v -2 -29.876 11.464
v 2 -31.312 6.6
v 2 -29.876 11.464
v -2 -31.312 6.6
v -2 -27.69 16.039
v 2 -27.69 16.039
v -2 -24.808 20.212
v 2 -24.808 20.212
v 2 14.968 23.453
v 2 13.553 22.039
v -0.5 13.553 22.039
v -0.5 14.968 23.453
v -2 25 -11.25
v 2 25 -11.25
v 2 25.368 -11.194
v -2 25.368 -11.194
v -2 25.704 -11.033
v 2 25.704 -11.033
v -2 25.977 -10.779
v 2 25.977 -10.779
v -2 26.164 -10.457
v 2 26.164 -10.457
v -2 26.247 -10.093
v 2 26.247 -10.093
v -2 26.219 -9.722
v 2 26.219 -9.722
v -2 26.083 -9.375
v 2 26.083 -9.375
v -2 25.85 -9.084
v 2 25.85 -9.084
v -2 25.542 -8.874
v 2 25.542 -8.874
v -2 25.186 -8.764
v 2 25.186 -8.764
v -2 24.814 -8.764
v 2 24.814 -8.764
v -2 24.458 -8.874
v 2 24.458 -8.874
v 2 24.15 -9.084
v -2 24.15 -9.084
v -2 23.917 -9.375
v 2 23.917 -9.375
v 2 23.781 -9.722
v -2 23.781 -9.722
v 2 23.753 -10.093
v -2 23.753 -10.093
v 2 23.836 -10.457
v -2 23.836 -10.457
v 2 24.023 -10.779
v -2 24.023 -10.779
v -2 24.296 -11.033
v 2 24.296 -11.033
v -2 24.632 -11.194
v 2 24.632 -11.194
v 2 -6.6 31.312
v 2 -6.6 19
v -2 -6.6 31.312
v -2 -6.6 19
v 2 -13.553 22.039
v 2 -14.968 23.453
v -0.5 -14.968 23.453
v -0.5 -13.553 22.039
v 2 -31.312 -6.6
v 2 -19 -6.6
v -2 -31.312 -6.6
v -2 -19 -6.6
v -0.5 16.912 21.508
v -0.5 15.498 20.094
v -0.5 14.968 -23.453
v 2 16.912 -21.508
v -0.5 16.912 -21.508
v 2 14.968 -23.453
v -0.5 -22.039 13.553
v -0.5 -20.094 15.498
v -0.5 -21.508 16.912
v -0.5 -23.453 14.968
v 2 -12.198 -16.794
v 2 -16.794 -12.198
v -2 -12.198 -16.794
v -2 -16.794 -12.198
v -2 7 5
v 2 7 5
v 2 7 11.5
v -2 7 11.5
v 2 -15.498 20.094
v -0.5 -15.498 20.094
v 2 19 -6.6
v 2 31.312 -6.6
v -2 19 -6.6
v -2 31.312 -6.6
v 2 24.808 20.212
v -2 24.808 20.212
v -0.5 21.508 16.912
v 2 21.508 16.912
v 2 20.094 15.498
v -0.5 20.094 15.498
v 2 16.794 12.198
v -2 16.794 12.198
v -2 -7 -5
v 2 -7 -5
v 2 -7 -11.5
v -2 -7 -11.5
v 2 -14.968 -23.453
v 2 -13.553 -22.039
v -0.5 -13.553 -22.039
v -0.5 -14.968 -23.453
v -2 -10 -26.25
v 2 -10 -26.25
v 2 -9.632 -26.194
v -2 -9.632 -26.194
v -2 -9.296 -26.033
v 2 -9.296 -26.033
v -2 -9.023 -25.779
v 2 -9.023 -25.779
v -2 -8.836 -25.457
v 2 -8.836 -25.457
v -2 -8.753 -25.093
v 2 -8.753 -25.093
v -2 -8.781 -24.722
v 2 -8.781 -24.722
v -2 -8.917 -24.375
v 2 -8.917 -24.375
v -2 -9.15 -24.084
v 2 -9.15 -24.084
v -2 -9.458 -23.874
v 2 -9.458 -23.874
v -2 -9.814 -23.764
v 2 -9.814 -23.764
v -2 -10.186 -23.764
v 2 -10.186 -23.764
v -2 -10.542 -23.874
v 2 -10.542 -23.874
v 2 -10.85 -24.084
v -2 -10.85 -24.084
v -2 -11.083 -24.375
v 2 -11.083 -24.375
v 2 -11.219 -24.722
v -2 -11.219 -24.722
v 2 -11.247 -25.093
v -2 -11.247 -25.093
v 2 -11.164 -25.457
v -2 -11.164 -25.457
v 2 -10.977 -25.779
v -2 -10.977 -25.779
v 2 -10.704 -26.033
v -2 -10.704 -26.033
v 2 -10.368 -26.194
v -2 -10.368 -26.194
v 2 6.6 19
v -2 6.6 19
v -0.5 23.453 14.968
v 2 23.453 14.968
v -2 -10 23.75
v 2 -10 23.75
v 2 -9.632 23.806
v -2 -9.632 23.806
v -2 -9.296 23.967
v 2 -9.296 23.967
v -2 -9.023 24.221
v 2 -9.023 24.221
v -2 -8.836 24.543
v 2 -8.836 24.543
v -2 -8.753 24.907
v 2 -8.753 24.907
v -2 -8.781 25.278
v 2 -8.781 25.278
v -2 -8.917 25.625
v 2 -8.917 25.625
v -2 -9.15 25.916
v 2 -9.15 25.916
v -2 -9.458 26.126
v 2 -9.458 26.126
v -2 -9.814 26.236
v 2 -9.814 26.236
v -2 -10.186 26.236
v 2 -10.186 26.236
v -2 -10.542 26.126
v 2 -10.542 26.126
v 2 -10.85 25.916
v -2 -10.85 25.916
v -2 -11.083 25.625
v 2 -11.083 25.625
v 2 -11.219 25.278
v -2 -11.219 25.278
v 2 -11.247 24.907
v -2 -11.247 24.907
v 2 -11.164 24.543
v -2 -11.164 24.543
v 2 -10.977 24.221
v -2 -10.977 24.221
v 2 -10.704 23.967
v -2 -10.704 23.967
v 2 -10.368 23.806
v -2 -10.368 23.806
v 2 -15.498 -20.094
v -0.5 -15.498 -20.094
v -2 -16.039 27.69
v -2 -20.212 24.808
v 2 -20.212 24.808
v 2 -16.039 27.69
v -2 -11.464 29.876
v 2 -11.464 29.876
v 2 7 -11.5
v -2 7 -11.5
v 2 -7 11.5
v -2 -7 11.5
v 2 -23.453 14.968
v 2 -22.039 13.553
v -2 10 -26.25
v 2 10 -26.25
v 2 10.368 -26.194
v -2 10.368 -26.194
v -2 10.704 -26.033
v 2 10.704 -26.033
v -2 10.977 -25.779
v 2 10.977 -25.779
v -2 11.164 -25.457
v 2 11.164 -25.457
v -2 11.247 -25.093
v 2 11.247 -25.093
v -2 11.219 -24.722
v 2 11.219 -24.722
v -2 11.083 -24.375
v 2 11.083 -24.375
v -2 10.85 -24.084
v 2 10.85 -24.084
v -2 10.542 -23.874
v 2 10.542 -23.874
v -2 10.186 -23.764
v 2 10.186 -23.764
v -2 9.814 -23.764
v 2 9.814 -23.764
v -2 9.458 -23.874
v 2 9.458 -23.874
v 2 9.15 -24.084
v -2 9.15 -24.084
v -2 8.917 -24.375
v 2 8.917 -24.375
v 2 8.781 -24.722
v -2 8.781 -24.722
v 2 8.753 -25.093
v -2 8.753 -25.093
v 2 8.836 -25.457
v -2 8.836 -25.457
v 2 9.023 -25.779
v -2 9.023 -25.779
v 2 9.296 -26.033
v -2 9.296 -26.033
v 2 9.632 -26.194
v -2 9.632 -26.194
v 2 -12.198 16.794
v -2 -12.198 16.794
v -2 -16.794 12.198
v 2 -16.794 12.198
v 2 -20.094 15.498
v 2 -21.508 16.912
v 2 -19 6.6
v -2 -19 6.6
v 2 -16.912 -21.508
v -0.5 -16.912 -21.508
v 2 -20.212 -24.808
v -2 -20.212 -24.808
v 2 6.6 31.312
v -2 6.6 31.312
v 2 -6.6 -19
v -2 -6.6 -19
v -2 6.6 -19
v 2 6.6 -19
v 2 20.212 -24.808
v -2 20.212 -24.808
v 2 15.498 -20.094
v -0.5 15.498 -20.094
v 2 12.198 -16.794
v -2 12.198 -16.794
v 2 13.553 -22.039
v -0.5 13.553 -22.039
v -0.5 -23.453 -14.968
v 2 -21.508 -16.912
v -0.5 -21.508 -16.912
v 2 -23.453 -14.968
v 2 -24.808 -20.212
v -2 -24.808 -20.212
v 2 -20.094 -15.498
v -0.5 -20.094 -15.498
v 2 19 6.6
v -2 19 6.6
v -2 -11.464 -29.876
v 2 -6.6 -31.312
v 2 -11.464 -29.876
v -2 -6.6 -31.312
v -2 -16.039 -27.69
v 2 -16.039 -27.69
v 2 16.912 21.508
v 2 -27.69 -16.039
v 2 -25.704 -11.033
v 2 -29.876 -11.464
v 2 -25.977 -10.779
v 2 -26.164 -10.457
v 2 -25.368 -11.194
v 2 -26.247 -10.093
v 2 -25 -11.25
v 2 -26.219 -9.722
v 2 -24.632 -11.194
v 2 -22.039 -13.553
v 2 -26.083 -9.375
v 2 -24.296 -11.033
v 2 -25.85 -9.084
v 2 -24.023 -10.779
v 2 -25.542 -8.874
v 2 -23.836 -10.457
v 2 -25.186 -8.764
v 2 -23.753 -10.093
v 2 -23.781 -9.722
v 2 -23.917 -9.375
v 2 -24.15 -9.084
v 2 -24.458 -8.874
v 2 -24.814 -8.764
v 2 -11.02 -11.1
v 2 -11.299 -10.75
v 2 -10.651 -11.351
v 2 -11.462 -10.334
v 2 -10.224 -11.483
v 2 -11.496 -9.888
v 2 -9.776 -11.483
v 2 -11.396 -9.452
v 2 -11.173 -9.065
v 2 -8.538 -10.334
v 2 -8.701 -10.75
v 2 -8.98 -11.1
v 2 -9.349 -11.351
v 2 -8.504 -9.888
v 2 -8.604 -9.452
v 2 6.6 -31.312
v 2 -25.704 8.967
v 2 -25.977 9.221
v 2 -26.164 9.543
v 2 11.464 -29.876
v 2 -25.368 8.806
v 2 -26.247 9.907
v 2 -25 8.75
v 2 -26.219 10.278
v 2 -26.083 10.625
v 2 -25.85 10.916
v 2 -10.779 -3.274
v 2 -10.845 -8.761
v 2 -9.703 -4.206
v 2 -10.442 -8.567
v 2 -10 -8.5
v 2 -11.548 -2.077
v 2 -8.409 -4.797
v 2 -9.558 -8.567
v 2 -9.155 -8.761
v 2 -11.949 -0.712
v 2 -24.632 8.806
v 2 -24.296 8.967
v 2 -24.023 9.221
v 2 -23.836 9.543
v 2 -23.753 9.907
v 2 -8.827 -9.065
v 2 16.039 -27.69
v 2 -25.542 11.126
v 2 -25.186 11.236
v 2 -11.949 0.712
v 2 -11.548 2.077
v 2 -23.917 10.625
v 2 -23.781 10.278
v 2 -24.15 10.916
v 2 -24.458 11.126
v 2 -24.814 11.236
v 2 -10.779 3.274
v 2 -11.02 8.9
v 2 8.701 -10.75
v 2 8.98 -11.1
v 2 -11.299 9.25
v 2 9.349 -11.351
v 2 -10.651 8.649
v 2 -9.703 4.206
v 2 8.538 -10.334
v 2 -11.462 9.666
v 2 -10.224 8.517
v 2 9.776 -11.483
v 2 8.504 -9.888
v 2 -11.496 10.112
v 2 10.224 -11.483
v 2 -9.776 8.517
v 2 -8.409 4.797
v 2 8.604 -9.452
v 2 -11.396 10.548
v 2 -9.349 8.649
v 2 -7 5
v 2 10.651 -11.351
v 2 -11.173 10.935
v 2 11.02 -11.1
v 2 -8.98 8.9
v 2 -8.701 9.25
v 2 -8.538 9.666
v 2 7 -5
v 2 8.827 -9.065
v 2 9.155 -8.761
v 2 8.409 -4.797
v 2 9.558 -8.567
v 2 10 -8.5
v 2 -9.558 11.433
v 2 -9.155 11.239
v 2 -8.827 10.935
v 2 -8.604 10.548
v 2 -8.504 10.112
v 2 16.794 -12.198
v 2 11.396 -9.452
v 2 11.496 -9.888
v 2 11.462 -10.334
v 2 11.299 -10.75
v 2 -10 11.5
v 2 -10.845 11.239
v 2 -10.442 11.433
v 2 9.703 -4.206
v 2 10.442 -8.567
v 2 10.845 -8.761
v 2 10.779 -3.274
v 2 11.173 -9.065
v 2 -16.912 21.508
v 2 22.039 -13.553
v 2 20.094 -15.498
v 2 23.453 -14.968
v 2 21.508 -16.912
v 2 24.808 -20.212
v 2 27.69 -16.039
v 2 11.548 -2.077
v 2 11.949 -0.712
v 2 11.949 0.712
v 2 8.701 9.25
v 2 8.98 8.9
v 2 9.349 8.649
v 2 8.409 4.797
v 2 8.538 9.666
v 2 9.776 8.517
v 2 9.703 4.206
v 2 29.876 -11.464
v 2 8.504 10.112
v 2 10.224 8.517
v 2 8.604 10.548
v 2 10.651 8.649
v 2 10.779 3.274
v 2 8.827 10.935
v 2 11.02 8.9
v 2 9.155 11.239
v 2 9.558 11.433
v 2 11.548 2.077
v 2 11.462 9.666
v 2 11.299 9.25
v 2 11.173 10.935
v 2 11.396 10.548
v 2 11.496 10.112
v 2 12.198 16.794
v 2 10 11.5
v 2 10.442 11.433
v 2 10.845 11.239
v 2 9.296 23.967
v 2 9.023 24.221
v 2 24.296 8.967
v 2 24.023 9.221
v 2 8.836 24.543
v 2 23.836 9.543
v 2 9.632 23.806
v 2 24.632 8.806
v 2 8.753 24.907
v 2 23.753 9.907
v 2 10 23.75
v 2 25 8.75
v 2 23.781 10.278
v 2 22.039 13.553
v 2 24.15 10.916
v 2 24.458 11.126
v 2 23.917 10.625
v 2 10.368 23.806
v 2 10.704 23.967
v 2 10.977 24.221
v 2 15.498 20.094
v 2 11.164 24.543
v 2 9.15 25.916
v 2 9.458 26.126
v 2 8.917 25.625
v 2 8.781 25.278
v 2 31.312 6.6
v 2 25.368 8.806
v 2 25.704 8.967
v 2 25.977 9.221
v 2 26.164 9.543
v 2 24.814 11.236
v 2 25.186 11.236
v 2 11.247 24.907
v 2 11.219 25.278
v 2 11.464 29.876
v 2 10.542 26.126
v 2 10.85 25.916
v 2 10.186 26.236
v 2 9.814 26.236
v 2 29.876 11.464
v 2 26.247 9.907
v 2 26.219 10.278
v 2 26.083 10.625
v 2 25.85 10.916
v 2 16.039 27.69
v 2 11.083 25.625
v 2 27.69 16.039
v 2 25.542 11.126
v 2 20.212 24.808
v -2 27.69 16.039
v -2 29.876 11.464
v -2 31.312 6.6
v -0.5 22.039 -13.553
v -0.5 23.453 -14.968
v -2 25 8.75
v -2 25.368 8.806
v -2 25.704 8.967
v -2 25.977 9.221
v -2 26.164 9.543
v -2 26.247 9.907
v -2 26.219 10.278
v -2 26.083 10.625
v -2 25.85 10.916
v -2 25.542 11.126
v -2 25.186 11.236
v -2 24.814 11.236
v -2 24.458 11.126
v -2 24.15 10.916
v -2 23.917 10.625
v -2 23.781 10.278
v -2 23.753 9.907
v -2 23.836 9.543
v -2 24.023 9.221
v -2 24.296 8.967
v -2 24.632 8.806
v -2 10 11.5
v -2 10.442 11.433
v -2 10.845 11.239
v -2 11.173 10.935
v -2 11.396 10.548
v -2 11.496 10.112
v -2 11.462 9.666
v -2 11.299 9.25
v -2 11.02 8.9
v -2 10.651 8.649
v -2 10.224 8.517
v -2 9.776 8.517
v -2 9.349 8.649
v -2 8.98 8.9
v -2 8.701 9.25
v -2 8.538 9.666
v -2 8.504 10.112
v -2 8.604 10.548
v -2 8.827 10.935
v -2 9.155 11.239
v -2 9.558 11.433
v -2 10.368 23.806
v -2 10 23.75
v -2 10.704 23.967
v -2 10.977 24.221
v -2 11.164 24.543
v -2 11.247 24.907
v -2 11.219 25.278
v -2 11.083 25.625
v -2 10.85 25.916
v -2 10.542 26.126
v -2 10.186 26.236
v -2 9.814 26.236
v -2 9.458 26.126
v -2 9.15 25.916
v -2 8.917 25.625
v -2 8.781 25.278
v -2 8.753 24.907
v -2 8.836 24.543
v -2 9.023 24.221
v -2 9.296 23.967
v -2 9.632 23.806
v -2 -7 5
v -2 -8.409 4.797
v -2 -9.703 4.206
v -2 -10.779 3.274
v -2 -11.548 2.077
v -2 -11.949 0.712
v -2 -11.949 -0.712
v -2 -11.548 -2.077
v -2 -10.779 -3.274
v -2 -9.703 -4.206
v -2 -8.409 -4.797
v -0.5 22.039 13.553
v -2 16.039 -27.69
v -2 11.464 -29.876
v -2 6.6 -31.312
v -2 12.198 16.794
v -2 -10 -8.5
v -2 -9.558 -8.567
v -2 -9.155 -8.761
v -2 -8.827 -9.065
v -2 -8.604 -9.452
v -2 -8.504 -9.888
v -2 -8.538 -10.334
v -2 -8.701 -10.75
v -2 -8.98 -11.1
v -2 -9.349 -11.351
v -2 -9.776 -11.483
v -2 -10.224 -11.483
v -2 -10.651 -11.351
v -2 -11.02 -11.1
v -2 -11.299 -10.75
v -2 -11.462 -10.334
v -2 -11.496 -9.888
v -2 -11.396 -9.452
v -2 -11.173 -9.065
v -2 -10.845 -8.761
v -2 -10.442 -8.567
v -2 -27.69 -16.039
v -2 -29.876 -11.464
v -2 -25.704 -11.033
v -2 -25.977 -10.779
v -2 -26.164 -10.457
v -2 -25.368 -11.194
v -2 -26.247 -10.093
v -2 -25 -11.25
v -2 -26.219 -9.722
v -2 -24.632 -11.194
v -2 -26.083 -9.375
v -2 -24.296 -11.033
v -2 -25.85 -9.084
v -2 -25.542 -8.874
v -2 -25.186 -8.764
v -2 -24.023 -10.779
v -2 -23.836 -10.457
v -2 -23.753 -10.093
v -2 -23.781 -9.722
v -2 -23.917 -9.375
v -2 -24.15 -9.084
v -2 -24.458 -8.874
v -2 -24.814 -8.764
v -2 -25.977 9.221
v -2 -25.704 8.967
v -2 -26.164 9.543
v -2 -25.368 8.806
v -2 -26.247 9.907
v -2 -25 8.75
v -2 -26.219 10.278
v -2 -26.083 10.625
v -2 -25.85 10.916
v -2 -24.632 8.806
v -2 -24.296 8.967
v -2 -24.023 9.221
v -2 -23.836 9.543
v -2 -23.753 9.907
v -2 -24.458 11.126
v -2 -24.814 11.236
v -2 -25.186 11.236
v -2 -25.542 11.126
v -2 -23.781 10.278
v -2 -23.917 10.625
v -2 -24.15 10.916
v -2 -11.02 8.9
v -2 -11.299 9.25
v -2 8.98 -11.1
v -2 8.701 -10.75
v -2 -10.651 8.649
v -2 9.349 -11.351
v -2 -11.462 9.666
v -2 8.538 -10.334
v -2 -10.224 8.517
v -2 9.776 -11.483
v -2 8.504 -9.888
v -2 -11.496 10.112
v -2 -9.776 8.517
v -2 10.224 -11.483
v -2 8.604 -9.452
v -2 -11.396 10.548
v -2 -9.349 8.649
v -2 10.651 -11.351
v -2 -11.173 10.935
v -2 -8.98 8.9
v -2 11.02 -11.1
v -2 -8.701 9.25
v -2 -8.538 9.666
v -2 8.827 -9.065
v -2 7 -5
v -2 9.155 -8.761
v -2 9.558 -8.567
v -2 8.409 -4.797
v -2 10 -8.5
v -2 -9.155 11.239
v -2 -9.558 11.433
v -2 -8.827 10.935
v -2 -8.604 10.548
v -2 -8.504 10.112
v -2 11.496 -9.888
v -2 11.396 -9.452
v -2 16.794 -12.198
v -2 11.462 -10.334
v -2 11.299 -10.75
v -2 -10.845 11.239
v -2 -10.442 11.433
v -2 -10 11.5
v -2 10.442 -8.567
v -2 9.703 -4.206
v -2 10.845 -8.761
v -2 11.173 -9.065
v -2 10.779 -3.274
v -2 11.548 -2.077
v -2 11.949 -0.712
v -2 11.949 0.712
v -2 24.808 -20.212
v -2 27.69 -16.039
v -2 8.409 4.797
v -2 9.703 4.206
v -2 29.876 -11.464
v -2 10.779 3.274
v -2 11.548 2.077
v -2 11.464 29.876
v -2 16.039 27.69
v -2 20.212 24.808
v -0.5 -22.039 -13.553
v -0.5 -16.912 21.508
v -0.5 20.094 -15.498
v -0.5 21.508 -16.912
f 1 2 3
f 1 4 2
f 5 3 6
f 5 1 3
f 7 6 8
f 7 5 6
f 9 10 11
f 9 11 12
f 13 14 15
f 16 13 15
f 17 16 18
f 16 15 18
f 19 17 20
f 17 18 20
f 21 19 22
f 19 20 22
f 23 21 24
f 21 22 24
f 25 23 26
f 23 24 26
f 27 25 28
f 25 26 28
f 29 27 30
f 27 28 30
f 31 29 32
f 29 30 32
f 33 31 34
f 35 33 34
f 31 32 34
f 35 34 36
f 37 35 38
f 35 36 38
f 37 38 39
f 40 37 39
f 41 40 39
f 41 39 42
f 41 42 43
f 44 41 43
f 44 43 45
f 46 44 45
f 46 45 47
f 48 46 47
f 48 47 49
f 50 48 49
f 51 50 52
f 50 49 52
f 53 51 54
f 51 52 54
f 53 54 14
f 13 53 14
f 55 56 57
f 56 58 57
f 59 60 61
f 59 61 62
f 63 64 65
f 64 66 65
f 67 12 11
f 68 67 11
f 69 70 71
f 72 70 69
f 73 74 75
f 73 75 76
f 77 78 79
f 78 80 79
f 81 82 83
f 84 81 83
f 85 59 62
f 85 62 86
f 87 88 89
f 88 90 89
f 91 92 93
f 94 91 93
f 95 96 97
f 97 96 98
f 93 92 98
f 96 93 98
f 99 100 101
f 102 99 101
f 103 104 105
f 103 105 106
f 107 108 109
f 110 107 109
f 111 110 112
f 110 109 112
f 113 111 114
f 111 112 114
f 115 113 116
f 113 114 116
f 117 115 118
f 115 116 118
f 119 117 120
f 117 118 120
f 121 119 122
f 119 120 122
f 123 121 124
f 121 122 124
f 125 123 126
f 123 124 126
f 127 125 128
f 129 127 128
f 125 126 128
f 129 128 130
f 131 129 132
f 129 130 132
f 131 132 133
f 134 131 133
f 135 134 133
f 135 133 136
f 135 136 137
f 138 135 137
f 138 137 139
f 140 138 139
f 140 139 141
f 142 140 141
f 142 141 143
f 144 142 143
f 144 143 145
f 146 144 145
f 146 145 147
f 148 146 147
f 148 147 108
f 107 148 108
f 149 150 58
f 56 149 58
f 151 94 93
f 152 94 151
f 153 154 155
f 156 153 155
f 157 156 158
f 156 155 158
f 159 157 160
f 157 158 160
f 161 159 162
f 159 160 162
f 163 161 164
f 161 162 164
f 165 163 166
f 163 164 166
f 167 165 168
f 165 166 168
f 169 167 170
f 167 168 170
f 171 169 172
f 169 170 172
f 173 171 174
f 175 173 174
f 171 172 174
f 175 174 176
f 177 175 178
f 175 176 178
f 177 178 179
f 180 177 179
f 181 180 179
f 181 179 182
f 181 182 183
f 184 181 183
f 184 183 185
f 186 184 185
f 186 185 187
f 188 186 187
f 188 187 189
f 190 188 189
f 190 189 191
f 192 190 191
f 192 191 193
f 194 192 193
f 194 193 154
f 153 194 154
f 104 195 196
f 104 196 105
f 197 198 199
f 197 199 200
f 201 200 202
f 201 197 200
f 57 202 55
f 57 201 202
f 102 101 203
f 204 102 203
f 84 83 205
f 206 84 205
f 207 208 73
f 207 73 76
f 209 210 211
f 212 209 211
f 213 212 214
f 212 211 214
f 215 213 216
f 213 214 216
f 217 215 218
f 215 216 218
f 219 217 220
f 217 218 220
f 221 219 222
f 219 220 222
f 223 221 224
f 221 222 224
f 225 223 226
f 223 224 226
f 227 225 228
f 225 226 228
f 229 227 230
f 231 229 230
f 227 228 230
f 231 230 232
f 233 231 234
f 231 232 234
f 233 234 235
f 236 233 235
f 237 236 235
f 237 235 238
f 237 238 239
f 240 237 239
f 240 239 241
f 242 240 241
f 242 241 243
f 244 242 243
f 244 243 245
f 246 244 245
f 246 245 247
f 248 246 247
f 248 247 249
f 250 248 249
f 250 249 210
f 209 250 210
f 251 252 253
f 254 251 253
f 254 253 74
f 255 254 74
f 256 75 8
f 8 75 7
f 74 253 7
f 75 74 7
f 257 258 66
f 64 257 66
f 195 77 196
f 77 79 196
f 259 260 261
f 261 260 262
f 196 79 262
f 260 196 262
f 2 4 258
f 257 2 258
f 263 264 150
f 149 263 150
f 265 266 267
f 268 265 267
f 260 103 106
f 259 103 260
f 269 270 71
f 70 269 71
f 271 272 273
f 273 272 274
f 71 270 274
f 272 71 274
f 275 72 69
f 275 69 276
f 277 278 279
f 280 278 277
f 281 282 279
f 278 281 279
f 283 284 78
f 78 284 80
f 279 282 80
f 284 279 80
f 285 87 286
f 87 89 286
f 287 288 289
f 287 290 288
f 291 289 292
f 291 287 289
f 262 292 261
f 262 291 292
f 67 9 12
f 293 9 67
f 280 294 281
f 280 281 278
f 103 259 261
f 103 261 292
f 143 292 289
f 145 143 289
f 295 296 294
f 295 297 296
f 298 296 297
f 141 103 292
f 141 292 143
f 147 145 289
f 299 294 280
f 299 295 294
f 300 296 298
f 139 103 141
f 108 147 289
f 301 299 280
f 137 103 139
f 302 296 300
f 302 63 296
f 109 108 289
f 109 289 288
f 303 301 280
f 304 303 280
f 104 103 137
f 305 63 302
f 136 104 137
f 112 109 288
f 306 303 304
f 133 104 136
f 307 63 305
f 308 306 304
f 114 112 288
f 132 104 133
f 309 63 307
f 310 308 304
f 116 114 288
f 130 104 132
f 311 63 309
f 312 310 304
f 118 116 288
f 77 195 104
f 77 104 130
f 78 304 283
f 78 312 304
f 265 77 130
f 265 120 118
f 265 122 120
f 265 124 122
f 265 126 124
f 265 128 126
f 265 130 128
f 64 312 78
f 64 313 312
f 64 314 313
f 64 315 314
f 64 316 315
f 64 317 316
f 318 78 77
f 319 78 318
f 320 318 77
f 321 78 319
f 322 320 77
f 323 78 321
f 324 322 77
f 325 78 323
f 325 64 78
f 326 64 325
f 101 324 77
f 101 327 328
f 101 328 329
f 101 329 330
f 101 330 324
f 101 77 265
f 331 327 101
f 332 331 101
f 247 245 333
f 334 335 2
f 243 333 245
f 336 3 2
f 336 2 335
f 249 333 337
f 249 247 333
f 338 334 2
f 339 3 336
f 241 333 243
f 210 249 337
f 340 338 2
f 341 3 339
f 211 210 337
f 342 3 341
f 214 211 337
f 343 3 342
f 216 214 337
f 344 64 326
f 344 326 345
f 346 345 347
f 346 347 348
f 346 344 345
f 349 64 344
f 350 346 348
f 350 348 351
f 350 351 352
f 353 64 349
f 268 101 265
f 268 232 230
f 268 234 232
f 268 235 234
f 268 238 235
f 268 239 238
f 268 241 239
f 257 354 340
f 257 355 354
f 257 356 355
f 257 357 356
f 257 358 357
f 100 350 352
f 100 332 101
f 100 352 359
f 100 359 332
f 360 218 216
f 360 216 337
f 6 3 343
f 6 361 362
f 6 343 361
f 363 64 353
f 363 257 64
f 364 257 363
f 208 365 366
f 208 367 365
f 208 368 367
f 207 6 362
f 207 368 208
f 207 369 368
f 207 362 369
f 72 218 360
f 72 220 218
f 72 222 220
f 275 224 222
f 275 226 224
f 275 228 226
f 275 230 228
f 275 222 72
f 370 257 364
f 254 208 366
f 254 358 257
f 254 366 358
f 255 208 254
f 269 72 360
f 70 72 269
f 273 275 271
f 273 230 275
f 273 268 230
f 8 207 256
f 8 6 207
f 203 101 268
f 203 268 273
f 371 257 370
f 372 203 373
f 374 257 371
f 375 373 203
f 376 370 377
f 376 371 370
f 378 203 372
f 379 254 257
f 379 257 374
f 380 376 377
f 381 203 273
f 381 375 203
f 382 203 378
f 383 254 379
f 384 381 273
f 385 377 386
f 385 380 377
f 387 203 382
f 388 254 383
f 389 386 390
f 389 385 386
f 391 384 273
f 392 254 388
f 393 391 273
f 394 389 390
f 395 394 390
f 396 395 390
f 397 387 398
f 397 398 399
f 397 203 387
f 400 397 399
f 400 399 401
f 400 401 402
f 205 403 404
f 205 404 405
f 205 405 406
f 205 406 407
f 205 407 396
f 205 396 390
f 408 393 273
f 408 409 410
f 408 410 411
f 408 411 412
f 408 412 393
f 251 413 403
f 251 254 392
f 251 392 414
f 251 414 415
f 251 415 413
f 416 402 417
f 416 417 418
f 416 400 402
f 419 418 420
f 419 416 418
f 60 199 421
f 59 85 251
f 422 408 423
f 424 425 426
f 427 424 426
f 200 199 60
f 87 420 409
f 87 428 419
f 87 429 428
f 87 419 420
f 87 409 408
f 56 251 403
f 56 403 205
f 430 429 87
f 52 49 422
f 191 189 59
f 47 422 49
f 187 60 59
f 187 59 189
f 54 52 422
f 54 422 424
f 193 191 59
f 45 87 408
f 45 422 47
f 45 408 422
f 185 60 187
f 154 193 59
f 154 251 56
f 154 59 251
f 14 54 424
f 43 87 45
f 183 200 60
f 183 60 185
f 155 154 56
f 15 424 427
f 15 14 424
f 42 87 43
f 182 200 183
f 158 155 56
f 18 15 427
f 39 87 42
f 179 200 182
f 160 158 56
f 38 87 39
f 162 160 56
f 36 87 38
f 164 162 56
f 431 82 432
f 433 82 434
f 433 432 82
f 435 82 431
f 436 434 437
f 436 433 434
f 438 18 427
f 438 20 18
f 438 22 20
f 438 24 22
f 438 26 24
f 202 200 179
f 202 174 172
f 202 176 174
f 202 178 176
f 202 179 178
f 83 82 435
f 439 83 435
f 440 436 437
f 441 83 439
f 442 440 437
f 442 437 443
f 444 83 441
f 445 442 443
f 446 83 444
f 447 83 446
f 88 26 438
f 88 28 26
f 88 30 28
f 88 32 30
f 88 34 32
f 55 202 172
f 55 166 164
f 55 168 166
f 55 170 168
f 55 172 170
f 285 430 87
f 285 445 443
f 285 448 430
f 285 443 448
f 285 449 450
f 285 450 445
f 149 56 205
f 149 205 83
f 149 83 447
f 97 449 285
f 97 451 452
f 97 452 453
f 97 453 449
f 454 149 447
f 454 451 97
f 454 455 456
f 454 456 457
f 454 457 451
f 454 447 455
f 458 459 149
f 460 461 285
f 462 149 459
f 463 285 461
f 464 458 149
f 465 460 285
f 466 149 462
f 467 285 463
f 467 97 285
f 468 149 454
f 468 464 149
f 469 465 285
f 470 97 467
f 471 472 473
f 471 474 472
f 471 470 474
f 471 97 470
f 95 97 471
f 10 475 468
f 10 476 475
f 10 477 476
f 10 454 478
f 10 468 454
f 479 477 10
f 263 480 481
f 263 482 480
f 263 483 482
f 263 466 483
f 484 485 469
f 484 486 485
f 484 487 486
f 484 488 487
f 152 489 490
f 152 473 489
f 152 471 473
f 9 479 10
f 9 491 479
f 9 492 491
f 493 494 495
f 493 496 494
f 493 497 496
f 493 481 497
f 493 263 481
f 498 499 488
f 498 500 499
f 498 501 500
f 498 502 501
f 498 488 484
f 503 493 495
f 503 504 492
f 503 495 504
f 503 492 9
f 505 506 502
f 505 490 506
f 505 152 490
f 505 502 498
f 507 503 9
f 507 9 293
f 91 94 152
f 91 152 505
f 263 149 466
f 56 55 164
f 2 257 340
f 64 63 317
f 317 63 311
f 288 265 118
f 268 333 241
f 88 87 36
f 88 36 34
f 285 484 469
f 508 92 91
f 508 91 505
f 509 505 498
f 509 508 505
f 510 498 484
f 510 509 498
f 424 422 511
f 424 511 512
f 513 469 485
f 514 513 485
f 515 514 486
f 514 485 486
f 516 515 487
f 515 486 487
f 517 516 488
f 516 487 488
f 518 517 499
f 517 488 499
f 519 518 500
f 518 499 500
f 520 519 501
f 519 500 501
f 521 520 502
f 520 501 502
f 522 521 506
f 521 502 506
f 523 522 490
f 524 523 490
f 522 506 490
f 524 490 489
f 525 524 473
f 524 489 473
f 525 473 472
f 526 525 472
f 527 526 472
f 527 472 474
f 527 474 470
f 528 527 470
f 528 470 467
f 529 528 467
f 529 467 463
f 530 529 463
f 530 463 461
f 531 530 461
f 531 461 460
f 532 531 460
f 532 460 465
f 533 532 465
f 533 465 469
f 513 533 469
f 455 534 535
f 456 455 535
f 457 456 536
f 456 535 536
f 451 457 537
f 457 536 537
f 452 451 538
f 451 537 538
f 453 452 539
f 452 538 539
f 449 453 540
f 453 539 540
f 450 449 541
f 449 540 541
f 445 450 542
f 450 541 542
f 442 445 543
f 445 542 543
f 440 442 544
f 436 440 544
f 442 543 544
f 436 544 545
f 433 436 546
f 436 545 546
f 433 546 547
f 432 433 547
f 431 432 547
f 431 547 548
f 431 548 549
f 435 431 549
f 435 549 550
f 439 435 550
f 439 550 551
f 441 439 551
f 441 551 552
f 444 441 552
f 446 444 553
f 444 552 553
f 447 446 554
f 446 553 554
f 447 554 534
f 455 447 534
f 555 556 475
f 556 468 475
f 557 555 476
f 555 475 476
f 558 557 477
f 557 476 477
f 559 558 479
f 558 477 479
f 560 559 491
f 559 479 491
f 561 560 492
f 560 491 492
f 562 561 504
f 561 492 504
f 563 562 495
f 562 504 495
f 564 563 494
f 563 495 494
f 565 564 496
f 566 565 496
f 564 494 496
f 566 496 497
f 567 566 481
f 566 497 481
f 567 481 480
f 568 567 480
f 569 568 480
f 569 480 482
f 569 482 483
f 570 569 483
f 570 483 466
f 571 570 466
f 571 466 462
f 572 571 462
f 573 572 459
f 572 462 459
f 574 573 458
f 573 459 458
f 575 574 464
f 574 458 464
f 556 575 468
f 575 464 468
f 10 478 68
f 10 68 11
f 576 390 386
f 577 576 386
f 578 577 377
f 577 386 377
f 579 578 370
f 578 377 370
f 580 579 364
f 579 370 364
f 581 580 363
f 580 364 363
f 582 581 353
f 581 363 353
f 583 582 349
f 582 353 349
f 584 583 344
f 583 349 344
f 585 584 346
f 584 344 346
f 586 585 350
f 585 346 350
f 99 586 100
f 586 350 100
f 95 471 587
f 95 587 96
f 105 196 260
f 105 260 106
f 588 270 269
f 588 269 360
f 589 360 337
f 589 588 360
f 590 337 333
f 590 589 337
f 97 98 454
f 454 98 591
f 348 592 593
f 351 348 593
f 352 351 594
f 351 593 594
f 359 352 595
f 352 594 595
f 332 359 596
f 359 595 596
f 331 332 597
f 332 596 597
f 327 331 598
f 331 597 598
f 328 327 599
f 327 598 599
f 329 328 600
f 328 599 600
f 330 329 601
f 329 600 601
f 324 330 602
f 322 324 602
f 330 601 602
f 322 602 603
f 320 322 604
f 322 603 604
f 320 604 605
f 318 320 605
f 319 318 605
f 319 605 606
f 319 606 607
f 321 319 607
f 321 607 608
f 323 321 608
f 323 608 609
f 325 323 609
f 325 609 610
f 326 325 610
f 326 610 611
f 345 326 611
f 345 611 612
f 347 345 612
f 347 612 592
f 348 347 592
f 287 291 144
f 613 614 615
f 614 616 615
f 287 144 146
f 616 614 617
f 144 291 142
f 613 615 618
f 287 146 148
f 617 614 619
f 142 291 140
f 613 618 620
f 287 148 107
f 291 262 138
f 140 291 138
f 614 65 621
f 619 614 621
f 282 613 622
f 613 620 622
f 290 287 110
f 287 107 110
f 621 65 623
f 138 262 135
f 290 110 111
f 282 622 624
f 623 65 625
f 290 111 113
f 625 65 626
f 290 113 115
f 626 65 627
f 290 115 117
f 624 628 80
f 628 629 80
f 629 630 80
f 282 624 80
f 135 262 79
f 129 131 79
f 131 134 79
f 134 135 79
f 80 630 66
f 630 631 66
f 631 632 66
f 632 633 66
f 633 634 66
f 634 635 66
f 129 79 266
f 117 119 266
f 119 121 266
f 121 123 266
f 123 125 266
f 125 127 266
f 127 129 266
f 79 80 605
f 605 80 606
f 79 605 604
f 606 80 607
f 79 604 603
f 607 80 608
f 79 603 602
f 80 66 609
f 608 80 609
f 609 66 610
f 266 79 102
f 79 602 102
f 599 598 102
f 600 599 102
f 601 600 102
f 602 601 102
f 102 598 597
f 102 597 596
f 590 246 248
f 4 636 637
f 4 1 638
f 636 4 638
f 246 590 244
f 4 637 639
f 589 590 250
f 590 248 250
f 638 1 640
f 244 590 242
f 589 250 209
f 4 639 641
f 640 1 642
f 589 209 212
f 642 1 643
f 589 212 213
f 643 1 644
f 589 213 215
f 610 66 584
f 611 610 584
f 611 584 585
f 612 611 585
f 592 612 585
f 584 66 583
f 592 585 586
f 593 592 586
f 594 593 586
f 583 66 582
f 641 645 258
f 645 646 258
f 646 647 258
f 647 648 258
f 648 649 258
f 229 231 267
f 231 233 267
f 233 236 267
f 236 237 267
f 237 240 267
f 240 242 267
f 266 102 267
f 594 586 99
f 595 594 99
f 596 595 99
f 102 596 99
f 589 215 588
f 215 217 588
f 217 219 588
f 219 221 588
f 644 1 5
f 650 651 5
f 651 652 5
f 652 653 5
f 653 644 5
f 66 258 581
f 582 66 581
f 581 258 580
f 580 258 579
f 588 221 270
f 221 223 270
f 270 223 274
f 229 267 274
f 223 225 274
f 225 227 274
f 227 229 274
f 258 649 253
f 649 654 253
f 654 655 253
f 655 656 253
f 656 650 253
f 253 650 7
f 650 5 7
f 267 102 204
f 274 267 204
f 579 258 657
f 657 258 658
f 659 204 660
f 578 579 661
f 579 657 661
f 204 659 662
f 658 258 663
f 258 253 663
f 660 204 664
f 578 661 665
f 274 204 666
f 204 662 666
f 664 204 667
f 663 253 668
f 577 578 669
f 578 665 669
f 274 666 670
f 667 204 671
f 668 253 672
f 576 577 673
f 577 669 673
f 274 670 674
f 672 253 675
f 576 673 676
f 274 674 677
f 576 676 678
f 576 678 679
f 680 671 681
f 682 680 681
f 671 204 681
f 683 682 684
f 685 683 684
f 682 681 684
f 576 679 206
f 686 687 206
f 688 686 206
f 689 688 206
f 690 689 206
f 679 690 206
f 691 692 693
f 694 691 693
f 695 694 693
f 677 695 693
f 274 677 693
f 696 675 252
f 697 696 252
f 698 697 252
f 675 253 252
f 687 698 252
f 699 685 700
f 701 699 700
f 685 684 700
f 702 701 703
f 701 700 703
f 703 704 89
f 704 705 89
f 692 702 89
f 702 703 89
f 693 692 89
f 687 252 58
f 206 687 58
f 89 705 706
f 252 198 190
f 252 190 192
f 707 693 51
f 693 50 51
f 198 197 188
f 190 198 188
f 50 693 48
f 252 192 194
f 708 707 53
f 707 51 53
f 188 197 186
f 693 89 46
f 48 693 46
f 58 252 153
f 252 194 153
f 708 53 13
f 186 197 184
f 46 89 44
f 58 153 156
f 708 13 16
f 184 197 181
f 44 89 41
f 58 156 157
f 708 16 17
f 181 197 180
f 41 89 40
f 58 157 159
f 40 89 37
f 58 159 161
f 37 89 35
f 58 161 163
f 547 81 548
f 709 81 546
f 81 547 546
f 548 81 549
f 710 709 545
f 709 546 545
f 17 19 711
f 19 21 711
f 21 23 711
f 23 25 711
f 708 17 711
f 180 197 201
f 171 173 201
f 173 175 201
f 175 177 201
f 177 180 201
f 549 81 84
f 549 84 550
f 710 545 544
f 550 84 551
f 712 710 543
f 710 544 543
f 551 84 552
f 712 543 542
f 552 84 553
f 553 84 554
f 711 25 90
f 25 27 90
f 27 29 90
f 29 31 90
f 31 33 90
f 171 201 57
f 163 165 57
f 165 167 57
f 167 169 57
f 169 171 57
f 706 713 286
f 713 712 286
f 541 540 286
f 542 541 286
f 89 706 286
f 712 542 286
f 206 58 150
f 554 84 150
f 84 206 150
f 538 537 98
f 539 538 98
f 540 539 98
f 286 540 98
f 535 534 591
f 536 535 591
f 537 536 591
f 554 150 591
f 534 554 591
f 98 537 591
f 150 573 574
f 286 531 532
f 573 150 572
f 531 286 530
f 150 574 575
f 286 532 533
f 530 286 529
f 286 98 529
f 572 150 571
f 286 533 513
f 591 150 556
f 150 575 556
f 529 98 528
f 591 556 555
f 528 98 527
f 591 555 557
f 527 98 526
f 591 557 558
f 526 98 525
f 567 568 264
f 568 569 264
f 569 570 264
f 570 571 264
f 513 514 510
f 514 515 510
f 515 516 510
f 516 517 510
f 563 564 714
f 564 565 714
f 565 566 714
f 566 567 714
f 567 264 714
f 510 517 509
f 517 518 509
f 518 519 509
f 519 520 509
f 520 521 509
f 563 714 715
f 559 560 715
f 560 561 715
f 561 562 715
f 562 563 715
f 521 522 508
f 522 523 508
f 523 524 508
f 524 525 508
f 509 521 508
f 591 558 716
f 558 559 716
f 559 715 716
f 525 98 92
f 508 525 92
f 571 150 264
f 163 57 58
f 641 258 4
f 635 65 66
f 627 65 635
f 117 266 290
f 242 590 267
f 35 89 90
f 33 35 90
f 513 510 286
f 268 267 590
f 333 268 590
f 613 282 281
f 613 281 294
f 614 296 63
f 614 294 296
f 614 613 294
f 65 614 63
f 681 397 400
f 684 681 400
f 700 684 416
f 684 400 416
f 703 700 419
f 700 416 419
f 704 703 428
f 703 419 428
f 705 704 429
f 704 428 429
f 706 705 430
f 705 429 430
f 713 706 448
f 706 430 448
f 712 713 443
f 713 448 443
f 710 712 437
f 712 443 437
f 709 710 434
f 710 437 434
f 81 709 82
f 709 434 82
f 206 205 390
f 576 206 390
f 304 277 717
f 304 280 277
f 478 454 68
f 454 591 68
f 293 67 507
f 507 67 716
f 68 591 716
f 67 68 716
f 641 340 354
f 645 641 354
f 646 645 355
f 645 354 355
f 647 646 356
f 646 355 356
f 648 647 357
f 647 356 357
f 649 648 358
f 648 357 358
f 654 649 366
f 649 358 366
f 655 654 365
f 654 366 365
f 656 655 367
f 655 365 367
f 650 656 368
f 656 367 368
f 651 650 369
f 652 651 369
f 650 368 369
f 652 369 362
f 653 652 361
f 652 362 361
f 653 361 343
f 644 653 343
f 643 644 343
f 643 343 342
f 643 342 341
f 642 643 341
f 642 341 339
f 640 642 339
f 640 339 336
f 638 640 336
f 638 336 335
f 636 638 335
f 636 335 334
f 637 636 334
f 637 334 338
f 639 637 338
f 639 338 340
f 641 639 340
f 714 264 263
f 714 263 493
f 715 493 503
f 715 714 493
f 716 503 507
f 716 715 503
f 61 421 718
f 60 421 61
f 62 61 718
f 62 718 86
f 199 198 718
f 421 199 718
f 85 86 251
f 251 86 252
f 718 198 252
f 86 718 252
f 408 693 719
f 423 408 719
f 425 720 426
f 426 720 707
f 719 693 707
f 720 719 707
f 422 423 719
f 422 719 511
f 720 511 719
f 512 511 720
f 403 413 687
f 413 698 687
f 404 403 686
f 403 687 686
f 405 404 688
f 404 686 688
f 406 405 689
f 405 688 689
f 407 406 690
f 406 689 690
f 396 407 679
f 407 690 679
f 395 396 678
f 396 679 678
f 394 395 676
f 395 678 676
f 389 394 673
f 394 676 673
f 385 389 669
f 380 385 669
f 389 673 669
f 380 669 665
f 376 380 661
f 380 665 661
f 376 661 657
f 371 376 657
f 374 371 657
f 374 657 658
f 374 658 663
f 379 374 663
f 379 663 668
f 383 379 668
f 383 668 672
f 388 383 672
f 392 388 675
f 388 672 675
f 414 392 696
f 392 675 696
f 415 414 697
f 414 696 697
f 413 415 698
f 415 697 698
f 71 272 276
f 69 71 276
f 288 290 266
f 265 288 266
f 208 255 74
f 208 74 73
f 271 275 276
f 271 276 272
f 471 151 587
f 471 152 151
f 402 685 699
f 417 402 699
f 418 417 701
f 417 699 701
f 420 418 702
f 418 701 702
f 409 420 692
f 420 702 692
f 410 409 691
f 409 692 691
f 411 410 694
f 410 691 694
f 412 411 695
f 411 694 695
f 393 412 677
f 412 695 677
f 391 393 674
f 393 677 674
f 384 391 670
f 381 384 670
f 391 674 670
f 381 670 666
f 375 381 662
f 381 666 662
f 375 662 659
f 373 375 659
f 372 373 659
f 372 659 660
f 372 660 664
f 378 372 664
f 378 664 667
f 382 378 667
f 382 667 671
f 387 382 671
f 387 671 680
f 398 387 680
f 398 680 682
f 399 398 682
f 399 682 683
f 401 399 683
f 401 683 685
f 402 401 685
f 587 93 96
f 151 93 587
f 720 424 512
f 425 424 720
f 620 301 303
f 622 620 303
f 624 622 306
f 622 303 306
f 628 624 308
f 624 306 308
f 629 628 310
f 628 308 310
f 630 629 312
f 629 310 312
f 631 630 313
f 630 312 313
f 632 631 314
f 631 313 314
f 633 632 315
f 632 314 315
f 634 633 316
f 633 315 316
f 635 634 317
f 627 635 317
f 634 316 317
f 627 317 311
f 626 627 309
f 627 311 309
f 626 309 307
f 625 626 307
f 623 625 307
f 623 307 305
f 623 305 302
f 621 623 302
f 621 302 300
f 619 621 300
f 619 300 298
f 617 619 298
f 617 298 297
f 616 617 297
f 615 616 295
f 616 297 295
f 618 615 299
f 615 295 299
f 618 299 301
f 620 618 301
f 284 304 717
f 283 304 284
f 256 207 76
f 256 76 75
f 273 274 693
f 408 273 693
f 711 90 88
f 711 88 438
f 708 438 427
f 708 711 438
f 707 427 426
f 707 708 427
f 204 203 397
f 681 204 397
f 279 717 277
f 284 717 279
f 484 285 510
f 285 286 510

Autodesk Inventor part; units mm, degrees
ref_plane "YZ Plane" through (0, 0, 0) normal (1, 0, 0) x (0, 1, 0)
ref_plane "XZ Plane" through (0, 0, 0) normal (0, 1, 0) x (-1, 0, 0)
ref_plane "XY Plane" through (0, 0, 0) normal (0, 0, 1) x (1, 0, 0)
sketch "Náčrt1" plane through (0, 0, 0) normal (1, 0, 0) x (0, 1, 0)
  line L0 (19, 6.6) -> (31.312, 6.6)
  line L1 (31.312, -6.6) -> (19, -6.6)
  line L2 (19, -6.6) -> (19, 6.6)
  line L3 (24.8085, 20.2123) -> (16.7938, 12.1976)
  line L4 (16.7938, 12.1976) -> (12.1976, 16.7938)
  line L5 (12.1976, 16.7938) -> (20.2123, 24.8085)
  line L6 (0, 0) -> (14.4957, 14.4957)
  line L7 (6.6, 19) -> (-6.6, 19)
  line L8 (6.6, 31.312) -> (6.6, 19)
  line L9 (-6.6, 19) -> (-6.6, 31.312)
  line L10 (-20.2123, 24.8085) -> (-12.1976, 16.7938)
  line L11 (-12.1976, 16.7938) -> (-16.7938, 12.1976)
  line L12 (-16.7938, 12.1976) -> (-24.8085, 20.2123)
  line L13 (-19, 6.6) -> (-19, -6.6)
  line L14 (-31.312, 6.6) -> (-19, 6.6)
  line L15 (-19, -6.6) -> (-31.312, -6.6)
  line L16 (-24.8085, -20.2123) -> (-16.7938, -12.1976)
  line L17 (-16.7938, -12.1976) -> (-12.1976, -16.7938)
  line L18 (-12.1976, -16.7938) -> (-20.2123, -24.8085)
  line L19 (-6.6, -19) -> (6.6, -19)
  line L20 (-6.6, -31.312) -> (-6.6, -19)
  line L21 (6.6, -19) -> (6.6, -31.312)
  line L22 (20.2123, -24.8085) -> (12.1976, -16.7938)
  line L23 (12.1976, -16.7938) -> (16.7938, -12.1976)
  line L24 (16.7938, -12.1976) -> (24.8085, -20.2123)
  arc A0 (24.8085, -20.2123) -> (31.312, -6.6) centre (0, 0) ccw
  arc A1 (6.6, -31.312) -> (20.2123, -24.8085) centre (0, 0) ccw
  arc A2 (-20.2123, -24.8085) -> (-6.6, -31.312) centre (0, 0) ccw
  arc A3 (-31.312, -6.6) -> (-24.8085, -20.2123) centre (0, 0) ccw
  arc A4 (-24.8085, 20.2123) -> (-31.312, 6.6) centre (0, 0) ccw
  arc A5 (-6.6, 31.312) -> (-20.2123, 24.8085) centre (0, 0) ccw
  arc A6 (31.312, 6.6) -> (24.8085, 20.2123) centre (0, 0) ccw
  arc A7 (20.2123, 24.8085) -> (6.6, 31.312) centre (0, 0) ccw
  line L25 (16.205, 20.8011) -> (20.8011, 16.205)
  line L26 (14.9675, 23.4528) -> (13.5533, 22.0386)
  line L27 (13.5533, 22.0386) -> (22.0386, 13.5533)
  line L28 (22.0386, 13.5533) -> (23.4528, 14.9675)
  line L29 (23.4528, 14.9675) -> (14.9675, 23.4528)
  line L30 (-13.5533, 22.0386) -> (-14.9675, 23.4528)
  line L31 (-22.0386, 13.5533) -> (-13.5533, 22.0386)
  line L32 (-14.9675, 23.4528) -> (-23.4528, 14.9675)
  line L33 (-23.4528, 14.9675) -> (-22.0386, 13.5533)
  line L34 (-22.0386, -13.5533) -> (-23.4528, -14.9675)
  line L35 (-13.5533, -22.0386) -> (-22.0386, -13.5533)
  line L36 (-23.4528, -14.9675) -> (-14.9675, -23.4528)
  line L37 (-14.9675, -23.4528) -> (-13.5533, -22.0386)
  line L38 (13.5533, -22.0386) -> (14.9675, -23.4528)
  line L39 (22.0386, -13.5533) -> (13.5533, -22.0386)
  line L40 (14.9675, -23.4528) -> (23.4528, -14.9675)
  line L41 (23.4528, -14.9675) -> (22.0386, -13.5533)
  point P0 (-14.4957, 14.4957)
  point P1 (-14.4957, -14.4957)
  point P2 (14.4957, -14.4957)
  dimension "d1" = 6.6
  dimension "d2" = 6.6
  dimension "d4" = 6.5
  dimension "d5" = 3.25
  dimension "d6" = 20.5
  dimension "d7" = 45
  dimension "d10" = 360
  dimension "d12" = 2
  dimension "d13" = 12
  dimension "d14" = 1
  dimension "d15" = 2.75
  dimension "d18" = 360
extrude "Vysunutí1" add sketch "Náčrt1" along normal mid plane 4 contours L2 L1 A0 L24 L40 L41 L39 L23 L22 L38 A1 L21 L19 L20 A2 L18 L36 L37 L35 L17 L16 L34 A3 L15 L13 L14 A4 L12 L32 L33 L31 L11 L10 L30 A5 L9 L7 L8 A7 L5 L29 L26 L27 L4 L3 L28 A6 L0 | L29 L28 L27 L3 | L5 L27 L26 L29 | L24 L39 L41 L40 | L40 L38 L39 L22 | L32 L30 L31 L10 | L12 L31 L33 L32 | L18 L35 L37 L36 | L36 L34 L35 L16
ref_plane "Pracovní rovina1" through (2, 0, 0) normal (1, 0, 0) x (0, 0, -1)
sketch "Náčrt2" plane through (2, 0, 0) normal (1, 0, 0) x (0, 0, -1)
  line L0 (-6.6, 19) -> (-6.6, 31.312) projected
  arc A0 (-6.6, 31.312) -> (-20.2123, 24.8085) centre (0, 0) ccw projected
  line L1 (-20.2123, 24.8085) -> (-12.1976, 16.7938) projected
  line L2 (-12.1976, 16.7938) -> (-16.7938, 12.1976) projected
  line L3 (-16.7938, 12.1976) -> (-24.8085, 20.2123) projected
  arc A1 (-24.8085, 20.2123) -> (-31.312, 6.6) centre (0, 0) ccw projected
  line L4 (-31.312, 6.6) -> (-19, 6.6) projected
  line L5 (-19, 6.6) -> (-19, -6.6) projected
  line L6 (-19, -6.6) -> (-31.312, -6.6) projected
  arc A2 (-31.312, -6.6) -> (-24.8085, -20.2123) centre (0, 0) ccw projected
  line L7 (-24.8085, -20.2123) -> (-16.7938, -12.1976) projected
  line L8 (-16.7938, -12.1976) -> (-12.1976, -16.7938) projected
  line L9 (-12.1976, -16.7938) -> (-20.2123, -24.8085) projected
  arc A3 (-20.2123, -24.8085) -> (-6.6, -31.312) centre (0, 0) ccw projected
  line L10 (-6.6, -31.312) -> (-6.6, -19) projected
  line L11 (-6.6, -19) -> (6.6, -19) projected
  line L12 (6.6, -19) -> (6.6, -31.312) projected
  arc A4 (6.6, -31.312) -> (20.2123, -24.8085) centre (0, 0) ccw projected
  line L13 (20.2123, -24.8085) -> (12.1976, -16.7938) projected
  line L14 (12.1976, -16.7938) -> (16.7938, -12.1976) projected
  line L15 (16.7938, -12.1976) -> (24.8085, -20.2123) projected
  arc A5 (24.8085, -20.2123) -> (31.312, -6.6) centre (0, 0) ccw projected
  line L16 (31.312, -6.6) -> (19, -6.6) projected
  line L17 (19, -6.6) -> (19, 6.6) projected
  line L18 (19, 6.6) -> (31.312, 6.6) projected
  arc A6 (31.312, 6.6) -> (24.8085, 20.2123) centre (0, 0) ccw projected
  line L19 (24.8085, 20.2123) -> (16.7938, 12.1976) projected
  line L20 (16.7938, 12.1976) -> (12.1976, 16.7938) projected
  line L21 (12.1976, 16.7938) -> (20.2123, 24.8085) projected
  arc A7 (20.2123, 24.8085) -> (6.6, 31.312) centre (0, 0) ccw projected
  line L22 (6.6, 31.312) -> (6.6, 19) projected
  line L23 (6.6, 19) -> (-6.6, 19) projected
  line L24 (-16.7938, 12.1976) -> (-24.8085, 20.2123) projected
  line L25 (-20.8011, 16.205) -> (-16.205, 20.8011)
  line L26 (-23.4528, 14.9675) -> (-14.9675, 23.4528)
  line L27 (-20.2123, 24.8085) -> (-12.1976, 16.7938) projected
  line L28 (-14.9675, 23.4528) -> (-13.5533, 22.0386)
  line L29 (-13.5533, 22.0386) -> (-22.0386, 13.5533)
  line L30 (-22.0386, 13.5533) -> (-23.4528, 14.9675)
  line L31 (-16.205, -20.8011) -> (-20.8011, -16.205)
  line L32 (-22.0386, -13.5533) -> (-13.5533, -22.0386)
  line L33 (-14.9675, -23.4528) -> (-23.4528, -14.9675)
  line L34 (-13.5533, -22.0386) -> (-14.9675, -23.4528)
  line L35 (-23.4528, -14.9675) -> (-22.0386, -13.5533)
  line L36 (20.8011, -16.205) -> (16.205, -20.8011)
  line L37 (13.5533, -22.0386) -> (22.0386, -13.5533)
  line L38 (23.4528, -14.9675) -> (14.9675, -23.4528)
  line L39 (22.0386, -13.5533) -> (23.4528, -14.9675)
  line L40 (14.9675, -23.4528) -> (13.5533, -22.0386)
  line L41 (16.205, 20.8011) -> (20.8011, 16.205)
  line L42 (22.0386, 13.5533) -> (13.5533, 22.0386)
  line L43 (14.9675, 23.4528) -> (23.4528, 14.9675)
  line L44 (13.5533, 22.0386) -> (14.9675, 23.4528)
  line L45 (23.4528, 14.9675) -> (22.0386, 13.5533)
  dimension "d23" = 12
  dimension "d24" = 2
  dimension "d25" = 1
  dimension "d26" = 2.75
  dimension "d27" = 6.5
  dimension "d30" = 360
extrude "Vysunutí2" cut sketch "Náčrt2" against normal blind 2.5 contours L26 L28 L29 L1 | L1 L25 L3 L26 | L1 L29 L3 L25 | L3 L29 L30 L26 | L43 L19 L41 L21 | L21 L42 L44 L43 | L41 L19 L42 L21 | L43 L45 L42 L19 | L33 L35 L32 L7 | L7 L31 L9 L33 | L7 L32 L9 L31 | L9 L32 L34 L33 | L38 L13 L36 L15 | L15 L37 L39 L38 | L36 L13 L37 L15 | L38 L40 L37 L13
sketch "Náčrt3" plane through (2, 0, 0) normal (1, 0, 0) x (0, 0, -1)
  line L0 (-11.5, 7) -> (-11.5, -7)
  line L1 (11.5, -7) -> (11.5, 7)
  arc A0 (5, 7) -> (-5, 7) centre (0, 7) ccw
  arc A1 (-5, -7) -> (5, -7) centre (0, -7) ccw
  line L2 (-11.5, -7) -> (-5, -7)
  line L3 (5, -7) -> (11.5, -7)
  line L4 (11.5, 7) -> (5, 7)
  line L5 (-5, 7) -> (-11.5, 7)
  point P0 (0, 0)
  dimension "d34" = 23
  dimension "d35" = 14
  dimension "d37" = 11.5
  dimension "d38" = 10
  dimension "d39" = 10
extrude "Vysunutí3" cut sketch "Náčrt3" against normal blind 4
ref_plane "Pracovní rovina2" through (-2, 0, 0) normal (-1, 0, 0) x (0, 0, 1)
sketch "Náčrt4" plane through (-2, 0, 0) normal (-1, 0, 0) x (0, 0, 1)
  line L0 (-11.5, 7) -> (-5, 7) projected
  arc A0 (5, 7) -> (-5, 7) centre (0, 7) ccw projected
  line L1 (5, 7) -> (11.5, 7) projected
  line L2 (11.5, 7) -> (11.5, -7) projected
  line L3 (11.5, -7) -> (5, -7) projected
  arc A1 (-5, -7) -> (5, -7) centre (0, -7) ccw projected
  line L4 (-5, -7) -> (-11.5, -7) projected
  line L5 (-11.5, -7) -> (-11.5, 7) projected
  line L6 (6.6, 31.312) -> (6.6, 19) projected
  line L7 (6.6, 19) -> (-6.6, 19) projected
  line L8 (-6.6, 19) -> (-6.6, 31.312) projected
  arc A2 (-6.6, 31.312) -> (-20.2123, 24.8085) centre (0, 0) ccw projected
  line L9 (-20.2123, 24.8085) -> (-12.1976, 16.7938) projected
  line L10 (-12.1976, 16.7938) -> (-16.7938, 12.1976) projected
  line L11 (-16.7938, 12.1976) -> (-24.8085, 20.2123) projected
  arc A3 (-24.8085, 20.2123) -> (-31.312, 6.6) centre (0, 0) ccw projected
  line L12 (-31.312, 6.6) -> (-19, 6.6) projected
  line L13 (-19, 6.6) -> (-19, -6.6) projected
  line L14 (-19, -6.6) -> (-31.312, -6.6) projected
  arc A4 (-31.312, -6.6) -> (-24.8085, -20.2123) centre (0, 0) ccw projected
  line L15 (-24.8085, -20.2123) -> (-16.7938, -12.1976) projected
  line L16 (-16.7938, -12.1976) -> (-12.1976, -16.7938) projected
  line L17 (-12.1976, -16.7938) -> (-20.2123, -24.8085) projected
  arc A5 (-20.2123, -24.8085) -> (-6.6, -31.312) centre (0, 0) ccw projected
  line L18 (-6.6, -31.312) -> (-6.6, -19) projected
  line L19 (-6.6, -19) -> (6.6, -19) projected
  line L20 (6.6, -19) -> (6.6, -31.312) projected
  arc A6 (6.6, -31.312) -> (20.2123, -24.8085) centre (0, 0) ccw projected
  line L21 (20.2123, -24.8085) -> (12.1976, -16.7938) projected
  line L22 (12.1976, -16.7938) -> (16.7938, -12.1976) projected
  line L23 (16.7938, -12.1976) -> (24.8085, -20.2123) projected
  arc A7 (24.8085, -20.2123) -> (31.312, -6.6) centre (0, 0) ccw projected
  line L24 (31.312, -6.6) -> (19, -6.6) projected
  line L25 (19, -6.6) -> (19, 6.6) projected
  line L26 (19, 6.6) -> (31.312, 6.6) projected
  arc A8 (31.312, 6.6) -> (24.8085, 20.2123) centre (0, 0) ccw projected
  line L27 (24.8085, 20.2123) -> (16.7938, 12.1976) projected
  line L28 (16.7938, 12.1976) -> (12.1976, 16.7938) projected
  line L29 (12.1976, 16.7938) -> (20.2123, 24.8085) projected
  arc A9 (20.2123, 24.8085) -> (6.6, 31.312) centre (0, 0) ccw projected
  line L30 (16.7938, 12.1976) -> (12.1976, 16.7938) projected
  line L31 (-16.7938, -12.1976) -> (-12.1976, -16.7938) projected
sketch "Náčrt5" plane through (-2, 0, 0) normal (-1, 0, 0) x (0, 0, 1)
  circle A0 centre (10, -10) radius 1.5
  circle A1 centre (10, 10) radius 1.5
  circle A2 centre (-10, 10) radius 1.5
  circle A3 centre (-10, -10) radius 1.5
  point P0 (0, 0)
  dimension "d45" = 360
  dimension "d47" = 10
  dimension "d48" = 10
  dimension "d49" = 3
extrude "Vysunutí4" cut sketch "Náčrt5" against normal blind 4
sketch "Náčrt6" plane through (2, 0, 0) normal (1, 0, 0) x (0, 0, -1)
  circle A0 centre (10, 25) radius 1.25
  circle A1 centre (-10, 25) radius 1.25
  circle A2 centre (-25, 10) radius 1.25
  circle A3 centre (-25, -10) radius 1.25
  circle A4 centre (-10, -25) radius 1.25
  circle A5 centre (10, -25) radius 1.25
  circle A6 centre (25, -10) radius 1.25
  circle A7 centre (25, 10) radius 1.25
  point P0 (0, 0)
  dimension "d52" = 2.5
  dimension "d53" = 2.5
  dimension "d54" = 25
  dimension "d55" = 25
  dimension "d56" = 10
  dimension "d57" = 10
  dimension "d60" = 360
extrude "Vysunutí5" cut sketch "Náčrt6" against normal blind 4
equation "\"d2\" = d1"
equation "\"d5\" = 0.5 * d4"
equation "\"d14\" = 0.5 * d12"
equation "\"d15\" = -0.5 * d4 + 0.5 * d13"
equation "\"d25\" = 0.5 * d24"
equation "\"d26\" = -0.5 * d27 + 0.5 * d23"
equation "\"d37\" = 0.5 * d34"
equation "\"d39\" = d38"
equation "\"d48\" = d47"
equation "\"d53\" = d52"
equation "\"d55\" = d54"
equation "\"d57\" = d56"
equation "\"d36\" = 0.5 * d35"
properties part number "deska"
